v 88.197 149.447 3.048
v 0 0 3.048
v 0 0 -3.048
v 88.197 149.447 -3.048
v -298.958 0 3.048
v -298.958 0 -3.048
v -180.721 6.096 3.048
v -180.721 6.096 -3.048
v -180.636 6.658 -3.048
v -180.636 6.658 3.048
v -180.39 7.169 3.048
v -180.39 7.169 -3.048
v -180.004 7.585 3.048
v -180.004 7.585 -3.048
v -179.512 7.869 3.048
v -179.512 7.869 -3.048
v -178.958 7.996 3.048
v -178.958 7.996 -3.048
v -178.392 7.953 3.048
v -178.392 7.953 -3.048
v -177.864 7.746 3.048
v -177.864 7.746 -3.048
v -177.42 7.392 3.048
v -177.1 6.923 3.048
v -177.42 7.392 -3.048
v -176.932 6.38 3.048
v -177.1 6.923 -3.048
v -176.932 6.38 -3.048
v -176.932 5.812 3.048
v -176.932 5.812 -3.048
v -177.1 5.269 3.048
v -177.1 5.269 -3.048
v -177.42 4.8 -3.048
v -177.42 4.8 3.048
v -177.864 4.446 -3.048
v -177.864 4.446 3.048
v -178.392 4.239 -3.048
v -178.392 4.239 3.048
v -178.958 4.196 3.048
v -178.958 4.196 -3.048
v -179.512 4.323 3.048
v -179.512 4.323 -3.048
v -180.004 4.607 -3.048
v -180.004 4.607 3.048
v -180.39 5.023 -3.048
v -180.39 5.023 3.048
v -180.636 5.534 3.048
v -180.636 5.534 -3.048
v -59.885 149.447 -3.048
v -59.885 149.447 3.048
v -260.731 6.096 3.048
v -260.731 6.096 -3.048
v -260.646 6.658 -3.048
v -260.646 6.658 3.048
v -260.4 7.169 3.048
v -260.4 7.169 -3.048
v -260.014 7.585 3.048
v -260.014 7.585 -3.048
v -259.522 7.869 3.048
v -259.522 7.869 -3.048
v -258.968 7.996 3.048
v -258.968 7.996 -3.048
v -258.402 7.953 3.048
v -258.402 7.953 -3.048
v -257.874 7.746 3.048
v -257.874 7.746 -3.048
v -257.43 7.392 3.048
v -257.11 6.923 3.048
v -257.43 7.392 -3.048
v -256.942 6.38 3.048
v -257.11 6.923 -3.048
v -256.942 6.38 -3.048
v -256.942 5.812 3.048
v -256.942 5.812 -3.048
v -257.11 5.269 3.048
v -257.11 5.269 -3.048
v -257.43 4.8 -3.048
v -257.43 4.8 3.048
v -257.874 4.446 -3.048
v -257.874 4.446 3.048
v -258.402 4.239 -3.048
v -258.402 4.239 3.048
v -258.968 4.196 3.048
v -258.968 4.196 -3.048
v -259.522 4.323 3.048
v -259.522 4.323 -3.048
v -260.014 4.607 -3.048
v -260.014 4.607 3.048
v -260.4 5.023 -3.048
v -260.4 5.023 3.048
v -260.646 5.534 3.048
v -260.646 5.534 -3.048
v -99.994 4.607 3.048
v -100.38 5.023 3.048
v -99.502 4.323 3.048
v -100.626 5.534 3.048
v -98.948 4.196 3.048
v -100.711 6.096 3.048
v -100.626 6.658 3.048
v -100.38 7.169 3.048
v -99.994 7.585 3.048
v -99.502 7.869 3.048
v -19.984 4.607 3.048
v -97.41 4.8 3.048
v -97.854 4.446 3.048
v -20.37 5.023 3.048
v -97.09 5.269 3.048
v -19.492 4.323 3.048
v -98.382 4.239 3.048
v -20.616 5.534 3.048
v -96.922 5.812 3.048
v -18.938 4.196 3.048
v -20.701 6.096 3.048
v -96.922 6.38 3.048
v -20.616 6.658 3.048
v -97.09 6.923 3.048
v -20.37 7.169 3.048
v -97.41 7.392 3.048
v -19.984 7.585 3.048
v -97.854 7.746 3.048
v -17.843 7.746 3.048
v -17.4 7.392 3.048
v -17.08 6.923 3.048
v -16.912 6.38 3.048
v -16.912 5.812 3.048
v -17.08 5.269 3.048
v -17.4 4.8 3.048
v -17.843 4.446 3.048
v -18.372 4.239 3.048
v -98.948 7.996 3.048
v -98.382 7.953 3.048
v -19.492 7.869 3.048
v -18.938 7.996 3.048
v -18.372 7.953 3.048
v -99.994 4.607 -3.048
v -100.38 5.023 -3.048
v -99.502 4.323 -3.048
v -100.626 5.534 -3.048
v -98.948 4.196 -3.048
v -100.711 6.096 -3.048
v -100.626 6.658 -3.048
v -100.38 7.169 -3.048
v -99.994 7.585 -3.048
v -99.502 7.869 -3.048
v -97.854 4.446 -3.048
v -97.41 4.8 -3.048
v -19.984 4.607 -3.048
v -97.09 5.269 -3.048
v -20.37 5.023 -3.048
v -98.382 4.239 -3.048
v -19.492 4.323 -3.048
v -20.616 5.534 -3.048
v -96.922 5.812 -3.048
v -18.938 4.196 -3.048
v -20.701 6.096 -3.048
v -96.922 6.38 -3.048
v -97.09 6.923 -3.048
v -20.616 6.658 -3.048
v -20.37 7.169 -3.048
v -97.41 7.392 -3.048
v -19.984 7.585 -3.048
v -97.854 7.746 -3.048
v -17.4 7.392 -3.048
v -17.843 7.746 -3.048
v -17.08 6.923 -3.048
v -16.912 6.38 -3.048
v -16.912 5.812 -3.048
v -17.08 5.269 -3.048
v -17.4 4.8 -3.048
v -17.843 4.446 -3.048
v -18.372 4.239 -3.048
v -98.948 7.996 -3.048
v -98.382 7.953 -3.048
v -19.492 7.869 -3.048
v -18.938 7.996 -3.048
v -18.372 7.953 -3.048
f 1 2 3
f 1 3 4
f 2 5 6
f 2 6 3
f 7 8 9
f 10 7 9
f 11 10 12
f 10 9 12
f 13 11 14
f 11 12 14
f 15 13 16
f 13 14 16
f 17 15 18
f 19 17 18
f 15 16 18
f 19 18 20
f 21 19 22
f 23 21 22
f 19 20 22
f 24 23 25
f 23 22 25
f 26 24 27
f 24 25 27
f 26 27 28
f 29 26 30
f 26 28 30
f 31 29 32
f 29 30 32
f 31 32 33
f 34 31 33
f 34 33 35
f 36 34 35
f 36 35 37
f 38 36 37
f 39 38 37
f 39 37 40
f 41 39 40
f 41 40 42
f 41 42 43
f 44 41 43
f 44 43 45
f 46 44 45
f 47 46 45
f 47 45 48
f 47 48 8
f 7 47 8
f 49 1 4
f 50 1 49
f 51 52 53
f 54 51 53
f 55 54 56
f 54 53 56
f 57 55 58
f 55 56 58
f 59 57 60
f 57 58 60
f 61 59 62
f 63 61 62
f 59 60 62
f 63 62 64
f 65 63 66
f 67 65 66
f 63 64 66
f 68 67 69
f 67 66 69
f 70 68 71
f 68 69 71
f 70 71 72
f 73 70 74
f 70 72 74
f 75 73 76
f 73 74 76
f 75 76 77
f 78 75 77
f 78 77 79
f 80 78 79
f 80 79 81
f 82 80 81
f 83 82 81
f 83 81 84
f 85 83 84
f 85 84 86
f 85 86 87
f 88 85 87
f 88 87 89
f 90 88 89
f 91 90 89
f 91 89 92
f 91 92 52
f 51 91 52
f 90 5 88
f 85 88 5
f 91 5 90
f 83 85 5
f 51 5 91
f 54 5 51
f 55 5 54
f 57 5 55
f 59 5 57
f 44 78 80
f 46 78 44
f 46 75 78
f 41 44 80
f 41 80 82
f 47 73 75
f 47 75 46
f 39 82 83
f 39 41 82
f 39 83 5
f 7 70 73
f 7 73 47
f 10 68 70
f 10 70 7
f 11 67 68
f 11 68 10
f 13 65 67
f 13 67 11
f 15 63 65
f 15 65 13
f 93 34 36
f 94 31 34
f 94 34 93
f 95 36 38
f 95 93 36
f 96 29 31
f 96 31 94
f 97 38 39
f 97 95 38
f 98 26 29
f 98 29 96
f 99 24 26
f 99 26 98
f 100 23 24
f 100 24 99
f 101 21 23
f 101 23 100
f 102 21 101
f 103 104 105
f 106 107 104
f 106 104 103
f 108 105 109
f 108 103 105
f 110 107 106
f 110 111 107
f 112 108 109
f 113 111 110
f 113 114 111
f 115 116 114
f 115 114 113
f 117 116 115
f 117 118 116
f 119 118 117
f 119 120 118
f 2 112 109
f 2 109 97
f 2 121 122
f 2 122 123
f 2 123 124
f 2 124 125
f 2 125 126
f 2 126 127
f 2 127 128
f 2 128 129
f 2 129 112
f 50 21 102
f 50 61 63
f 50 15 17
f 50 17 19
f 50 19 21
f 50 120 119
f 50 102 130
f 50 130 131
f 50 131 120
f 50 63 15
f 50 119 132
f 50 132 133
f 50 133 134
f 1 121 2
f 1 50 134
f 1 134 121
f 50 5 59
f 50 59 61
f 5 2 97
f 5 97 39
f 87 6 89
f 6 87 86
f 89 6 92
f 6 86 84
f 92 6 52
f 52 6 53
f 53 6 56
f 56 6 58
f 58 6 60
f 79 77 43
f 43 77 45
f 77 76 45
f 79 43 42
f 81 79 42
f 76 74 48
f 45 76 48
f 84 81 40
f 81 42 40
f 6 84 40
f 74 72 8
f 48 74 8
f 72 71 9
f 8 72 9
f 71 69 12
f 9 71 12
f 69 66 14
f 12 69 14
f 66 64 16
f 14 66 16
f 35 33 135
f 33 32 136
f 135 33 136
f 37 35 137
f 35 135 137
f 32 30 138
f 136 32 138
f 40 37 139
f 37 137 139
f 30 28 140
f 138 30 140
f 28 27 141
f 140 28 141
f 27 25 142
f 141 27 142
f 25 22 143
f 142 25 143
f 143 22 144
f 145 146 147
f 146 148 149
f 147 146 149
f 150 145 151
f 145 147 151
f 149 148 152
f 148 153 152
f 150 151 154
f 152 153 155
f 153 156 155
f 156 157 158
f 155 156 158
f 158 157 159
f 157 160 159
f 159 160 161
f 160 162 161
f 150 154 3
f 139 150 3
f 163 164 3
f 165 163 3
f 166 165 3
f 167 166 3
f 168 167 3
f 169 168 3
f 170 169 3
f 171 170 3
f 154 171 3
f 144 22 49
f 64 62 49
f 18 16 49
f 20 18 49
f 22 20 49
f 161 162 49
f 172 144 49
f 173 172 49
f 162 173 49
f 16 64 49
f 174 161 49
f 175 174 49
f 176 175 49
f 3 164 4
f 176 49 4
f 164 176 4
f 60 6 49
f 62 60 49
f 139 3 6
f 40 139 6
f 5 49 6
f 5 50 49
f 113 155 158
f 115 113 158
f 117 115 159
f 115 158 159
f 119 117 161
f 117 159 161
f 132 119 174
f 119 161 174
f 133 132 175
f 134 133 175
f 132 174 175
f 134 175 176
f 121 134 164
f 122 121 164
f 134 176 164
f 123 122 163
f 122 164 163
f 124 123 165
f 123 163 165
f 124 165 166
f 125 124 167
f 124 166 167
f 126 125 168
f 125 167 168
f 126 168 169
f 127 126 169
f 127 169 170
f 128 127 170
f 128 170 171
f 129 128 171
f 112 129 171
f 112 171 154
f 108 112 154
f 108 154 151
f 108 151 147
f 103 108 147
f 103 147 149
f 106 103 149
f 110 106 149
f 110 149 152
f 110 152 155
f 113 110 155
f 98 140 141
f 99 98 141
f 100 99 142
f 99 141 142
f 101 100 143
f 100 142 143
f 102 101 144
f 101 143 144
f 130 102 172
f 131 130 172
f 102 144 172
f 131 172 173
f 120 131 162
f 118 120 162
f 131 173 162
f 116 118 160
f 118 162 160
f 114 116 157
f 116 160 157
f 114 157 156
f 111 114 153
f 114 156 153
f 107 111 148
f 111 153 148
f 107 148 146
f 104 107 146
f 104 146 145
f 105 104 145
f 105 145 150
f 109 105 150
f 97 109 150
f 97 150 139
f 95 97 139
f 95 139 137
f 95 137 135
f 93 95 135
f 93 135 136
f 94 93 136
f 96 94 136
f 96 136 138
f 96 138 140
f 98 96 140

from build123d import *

# Parameters (mm, degrees)
BOSS_EXTRUDE1_DEPTH = 3.048
HOLE1_D             = 3.81
HOLE1_DEPTH         = 15.24
LPATTERN1_COUNT     = 4
LPATTERN1_PITCH     = 80.01


with BuildPart() as part:
    # Sketch1 → Boss-Extrude1 (new, symmetric)
    with BuildSketch(Plane.XY):
        Polygon((-59.885399579, 149.447165674), (-298.958, 0), (0, 0), (88.196600421, 149.447165674), align=None)
    extrude(amount=BOSS_EXTRUDE1_DEPTH, both=True)

    # Hole1
    with Locations(Plane.XY.offset(3.048)):
        with Locations((-258.826, 6.096)):
            hole1 = Hole(HOLE1_D / 2, depth=HOLE1_DEPTH)

    # LPattern1: Hole1 ×4
    with Locations(*[(i * LPATTERN1_PITCH, 0, 0) for i in range(1, LPATTERN1_COUNT)]):
        add(hole1, mode=Mode.SUBTRACT)


solid = part.part
